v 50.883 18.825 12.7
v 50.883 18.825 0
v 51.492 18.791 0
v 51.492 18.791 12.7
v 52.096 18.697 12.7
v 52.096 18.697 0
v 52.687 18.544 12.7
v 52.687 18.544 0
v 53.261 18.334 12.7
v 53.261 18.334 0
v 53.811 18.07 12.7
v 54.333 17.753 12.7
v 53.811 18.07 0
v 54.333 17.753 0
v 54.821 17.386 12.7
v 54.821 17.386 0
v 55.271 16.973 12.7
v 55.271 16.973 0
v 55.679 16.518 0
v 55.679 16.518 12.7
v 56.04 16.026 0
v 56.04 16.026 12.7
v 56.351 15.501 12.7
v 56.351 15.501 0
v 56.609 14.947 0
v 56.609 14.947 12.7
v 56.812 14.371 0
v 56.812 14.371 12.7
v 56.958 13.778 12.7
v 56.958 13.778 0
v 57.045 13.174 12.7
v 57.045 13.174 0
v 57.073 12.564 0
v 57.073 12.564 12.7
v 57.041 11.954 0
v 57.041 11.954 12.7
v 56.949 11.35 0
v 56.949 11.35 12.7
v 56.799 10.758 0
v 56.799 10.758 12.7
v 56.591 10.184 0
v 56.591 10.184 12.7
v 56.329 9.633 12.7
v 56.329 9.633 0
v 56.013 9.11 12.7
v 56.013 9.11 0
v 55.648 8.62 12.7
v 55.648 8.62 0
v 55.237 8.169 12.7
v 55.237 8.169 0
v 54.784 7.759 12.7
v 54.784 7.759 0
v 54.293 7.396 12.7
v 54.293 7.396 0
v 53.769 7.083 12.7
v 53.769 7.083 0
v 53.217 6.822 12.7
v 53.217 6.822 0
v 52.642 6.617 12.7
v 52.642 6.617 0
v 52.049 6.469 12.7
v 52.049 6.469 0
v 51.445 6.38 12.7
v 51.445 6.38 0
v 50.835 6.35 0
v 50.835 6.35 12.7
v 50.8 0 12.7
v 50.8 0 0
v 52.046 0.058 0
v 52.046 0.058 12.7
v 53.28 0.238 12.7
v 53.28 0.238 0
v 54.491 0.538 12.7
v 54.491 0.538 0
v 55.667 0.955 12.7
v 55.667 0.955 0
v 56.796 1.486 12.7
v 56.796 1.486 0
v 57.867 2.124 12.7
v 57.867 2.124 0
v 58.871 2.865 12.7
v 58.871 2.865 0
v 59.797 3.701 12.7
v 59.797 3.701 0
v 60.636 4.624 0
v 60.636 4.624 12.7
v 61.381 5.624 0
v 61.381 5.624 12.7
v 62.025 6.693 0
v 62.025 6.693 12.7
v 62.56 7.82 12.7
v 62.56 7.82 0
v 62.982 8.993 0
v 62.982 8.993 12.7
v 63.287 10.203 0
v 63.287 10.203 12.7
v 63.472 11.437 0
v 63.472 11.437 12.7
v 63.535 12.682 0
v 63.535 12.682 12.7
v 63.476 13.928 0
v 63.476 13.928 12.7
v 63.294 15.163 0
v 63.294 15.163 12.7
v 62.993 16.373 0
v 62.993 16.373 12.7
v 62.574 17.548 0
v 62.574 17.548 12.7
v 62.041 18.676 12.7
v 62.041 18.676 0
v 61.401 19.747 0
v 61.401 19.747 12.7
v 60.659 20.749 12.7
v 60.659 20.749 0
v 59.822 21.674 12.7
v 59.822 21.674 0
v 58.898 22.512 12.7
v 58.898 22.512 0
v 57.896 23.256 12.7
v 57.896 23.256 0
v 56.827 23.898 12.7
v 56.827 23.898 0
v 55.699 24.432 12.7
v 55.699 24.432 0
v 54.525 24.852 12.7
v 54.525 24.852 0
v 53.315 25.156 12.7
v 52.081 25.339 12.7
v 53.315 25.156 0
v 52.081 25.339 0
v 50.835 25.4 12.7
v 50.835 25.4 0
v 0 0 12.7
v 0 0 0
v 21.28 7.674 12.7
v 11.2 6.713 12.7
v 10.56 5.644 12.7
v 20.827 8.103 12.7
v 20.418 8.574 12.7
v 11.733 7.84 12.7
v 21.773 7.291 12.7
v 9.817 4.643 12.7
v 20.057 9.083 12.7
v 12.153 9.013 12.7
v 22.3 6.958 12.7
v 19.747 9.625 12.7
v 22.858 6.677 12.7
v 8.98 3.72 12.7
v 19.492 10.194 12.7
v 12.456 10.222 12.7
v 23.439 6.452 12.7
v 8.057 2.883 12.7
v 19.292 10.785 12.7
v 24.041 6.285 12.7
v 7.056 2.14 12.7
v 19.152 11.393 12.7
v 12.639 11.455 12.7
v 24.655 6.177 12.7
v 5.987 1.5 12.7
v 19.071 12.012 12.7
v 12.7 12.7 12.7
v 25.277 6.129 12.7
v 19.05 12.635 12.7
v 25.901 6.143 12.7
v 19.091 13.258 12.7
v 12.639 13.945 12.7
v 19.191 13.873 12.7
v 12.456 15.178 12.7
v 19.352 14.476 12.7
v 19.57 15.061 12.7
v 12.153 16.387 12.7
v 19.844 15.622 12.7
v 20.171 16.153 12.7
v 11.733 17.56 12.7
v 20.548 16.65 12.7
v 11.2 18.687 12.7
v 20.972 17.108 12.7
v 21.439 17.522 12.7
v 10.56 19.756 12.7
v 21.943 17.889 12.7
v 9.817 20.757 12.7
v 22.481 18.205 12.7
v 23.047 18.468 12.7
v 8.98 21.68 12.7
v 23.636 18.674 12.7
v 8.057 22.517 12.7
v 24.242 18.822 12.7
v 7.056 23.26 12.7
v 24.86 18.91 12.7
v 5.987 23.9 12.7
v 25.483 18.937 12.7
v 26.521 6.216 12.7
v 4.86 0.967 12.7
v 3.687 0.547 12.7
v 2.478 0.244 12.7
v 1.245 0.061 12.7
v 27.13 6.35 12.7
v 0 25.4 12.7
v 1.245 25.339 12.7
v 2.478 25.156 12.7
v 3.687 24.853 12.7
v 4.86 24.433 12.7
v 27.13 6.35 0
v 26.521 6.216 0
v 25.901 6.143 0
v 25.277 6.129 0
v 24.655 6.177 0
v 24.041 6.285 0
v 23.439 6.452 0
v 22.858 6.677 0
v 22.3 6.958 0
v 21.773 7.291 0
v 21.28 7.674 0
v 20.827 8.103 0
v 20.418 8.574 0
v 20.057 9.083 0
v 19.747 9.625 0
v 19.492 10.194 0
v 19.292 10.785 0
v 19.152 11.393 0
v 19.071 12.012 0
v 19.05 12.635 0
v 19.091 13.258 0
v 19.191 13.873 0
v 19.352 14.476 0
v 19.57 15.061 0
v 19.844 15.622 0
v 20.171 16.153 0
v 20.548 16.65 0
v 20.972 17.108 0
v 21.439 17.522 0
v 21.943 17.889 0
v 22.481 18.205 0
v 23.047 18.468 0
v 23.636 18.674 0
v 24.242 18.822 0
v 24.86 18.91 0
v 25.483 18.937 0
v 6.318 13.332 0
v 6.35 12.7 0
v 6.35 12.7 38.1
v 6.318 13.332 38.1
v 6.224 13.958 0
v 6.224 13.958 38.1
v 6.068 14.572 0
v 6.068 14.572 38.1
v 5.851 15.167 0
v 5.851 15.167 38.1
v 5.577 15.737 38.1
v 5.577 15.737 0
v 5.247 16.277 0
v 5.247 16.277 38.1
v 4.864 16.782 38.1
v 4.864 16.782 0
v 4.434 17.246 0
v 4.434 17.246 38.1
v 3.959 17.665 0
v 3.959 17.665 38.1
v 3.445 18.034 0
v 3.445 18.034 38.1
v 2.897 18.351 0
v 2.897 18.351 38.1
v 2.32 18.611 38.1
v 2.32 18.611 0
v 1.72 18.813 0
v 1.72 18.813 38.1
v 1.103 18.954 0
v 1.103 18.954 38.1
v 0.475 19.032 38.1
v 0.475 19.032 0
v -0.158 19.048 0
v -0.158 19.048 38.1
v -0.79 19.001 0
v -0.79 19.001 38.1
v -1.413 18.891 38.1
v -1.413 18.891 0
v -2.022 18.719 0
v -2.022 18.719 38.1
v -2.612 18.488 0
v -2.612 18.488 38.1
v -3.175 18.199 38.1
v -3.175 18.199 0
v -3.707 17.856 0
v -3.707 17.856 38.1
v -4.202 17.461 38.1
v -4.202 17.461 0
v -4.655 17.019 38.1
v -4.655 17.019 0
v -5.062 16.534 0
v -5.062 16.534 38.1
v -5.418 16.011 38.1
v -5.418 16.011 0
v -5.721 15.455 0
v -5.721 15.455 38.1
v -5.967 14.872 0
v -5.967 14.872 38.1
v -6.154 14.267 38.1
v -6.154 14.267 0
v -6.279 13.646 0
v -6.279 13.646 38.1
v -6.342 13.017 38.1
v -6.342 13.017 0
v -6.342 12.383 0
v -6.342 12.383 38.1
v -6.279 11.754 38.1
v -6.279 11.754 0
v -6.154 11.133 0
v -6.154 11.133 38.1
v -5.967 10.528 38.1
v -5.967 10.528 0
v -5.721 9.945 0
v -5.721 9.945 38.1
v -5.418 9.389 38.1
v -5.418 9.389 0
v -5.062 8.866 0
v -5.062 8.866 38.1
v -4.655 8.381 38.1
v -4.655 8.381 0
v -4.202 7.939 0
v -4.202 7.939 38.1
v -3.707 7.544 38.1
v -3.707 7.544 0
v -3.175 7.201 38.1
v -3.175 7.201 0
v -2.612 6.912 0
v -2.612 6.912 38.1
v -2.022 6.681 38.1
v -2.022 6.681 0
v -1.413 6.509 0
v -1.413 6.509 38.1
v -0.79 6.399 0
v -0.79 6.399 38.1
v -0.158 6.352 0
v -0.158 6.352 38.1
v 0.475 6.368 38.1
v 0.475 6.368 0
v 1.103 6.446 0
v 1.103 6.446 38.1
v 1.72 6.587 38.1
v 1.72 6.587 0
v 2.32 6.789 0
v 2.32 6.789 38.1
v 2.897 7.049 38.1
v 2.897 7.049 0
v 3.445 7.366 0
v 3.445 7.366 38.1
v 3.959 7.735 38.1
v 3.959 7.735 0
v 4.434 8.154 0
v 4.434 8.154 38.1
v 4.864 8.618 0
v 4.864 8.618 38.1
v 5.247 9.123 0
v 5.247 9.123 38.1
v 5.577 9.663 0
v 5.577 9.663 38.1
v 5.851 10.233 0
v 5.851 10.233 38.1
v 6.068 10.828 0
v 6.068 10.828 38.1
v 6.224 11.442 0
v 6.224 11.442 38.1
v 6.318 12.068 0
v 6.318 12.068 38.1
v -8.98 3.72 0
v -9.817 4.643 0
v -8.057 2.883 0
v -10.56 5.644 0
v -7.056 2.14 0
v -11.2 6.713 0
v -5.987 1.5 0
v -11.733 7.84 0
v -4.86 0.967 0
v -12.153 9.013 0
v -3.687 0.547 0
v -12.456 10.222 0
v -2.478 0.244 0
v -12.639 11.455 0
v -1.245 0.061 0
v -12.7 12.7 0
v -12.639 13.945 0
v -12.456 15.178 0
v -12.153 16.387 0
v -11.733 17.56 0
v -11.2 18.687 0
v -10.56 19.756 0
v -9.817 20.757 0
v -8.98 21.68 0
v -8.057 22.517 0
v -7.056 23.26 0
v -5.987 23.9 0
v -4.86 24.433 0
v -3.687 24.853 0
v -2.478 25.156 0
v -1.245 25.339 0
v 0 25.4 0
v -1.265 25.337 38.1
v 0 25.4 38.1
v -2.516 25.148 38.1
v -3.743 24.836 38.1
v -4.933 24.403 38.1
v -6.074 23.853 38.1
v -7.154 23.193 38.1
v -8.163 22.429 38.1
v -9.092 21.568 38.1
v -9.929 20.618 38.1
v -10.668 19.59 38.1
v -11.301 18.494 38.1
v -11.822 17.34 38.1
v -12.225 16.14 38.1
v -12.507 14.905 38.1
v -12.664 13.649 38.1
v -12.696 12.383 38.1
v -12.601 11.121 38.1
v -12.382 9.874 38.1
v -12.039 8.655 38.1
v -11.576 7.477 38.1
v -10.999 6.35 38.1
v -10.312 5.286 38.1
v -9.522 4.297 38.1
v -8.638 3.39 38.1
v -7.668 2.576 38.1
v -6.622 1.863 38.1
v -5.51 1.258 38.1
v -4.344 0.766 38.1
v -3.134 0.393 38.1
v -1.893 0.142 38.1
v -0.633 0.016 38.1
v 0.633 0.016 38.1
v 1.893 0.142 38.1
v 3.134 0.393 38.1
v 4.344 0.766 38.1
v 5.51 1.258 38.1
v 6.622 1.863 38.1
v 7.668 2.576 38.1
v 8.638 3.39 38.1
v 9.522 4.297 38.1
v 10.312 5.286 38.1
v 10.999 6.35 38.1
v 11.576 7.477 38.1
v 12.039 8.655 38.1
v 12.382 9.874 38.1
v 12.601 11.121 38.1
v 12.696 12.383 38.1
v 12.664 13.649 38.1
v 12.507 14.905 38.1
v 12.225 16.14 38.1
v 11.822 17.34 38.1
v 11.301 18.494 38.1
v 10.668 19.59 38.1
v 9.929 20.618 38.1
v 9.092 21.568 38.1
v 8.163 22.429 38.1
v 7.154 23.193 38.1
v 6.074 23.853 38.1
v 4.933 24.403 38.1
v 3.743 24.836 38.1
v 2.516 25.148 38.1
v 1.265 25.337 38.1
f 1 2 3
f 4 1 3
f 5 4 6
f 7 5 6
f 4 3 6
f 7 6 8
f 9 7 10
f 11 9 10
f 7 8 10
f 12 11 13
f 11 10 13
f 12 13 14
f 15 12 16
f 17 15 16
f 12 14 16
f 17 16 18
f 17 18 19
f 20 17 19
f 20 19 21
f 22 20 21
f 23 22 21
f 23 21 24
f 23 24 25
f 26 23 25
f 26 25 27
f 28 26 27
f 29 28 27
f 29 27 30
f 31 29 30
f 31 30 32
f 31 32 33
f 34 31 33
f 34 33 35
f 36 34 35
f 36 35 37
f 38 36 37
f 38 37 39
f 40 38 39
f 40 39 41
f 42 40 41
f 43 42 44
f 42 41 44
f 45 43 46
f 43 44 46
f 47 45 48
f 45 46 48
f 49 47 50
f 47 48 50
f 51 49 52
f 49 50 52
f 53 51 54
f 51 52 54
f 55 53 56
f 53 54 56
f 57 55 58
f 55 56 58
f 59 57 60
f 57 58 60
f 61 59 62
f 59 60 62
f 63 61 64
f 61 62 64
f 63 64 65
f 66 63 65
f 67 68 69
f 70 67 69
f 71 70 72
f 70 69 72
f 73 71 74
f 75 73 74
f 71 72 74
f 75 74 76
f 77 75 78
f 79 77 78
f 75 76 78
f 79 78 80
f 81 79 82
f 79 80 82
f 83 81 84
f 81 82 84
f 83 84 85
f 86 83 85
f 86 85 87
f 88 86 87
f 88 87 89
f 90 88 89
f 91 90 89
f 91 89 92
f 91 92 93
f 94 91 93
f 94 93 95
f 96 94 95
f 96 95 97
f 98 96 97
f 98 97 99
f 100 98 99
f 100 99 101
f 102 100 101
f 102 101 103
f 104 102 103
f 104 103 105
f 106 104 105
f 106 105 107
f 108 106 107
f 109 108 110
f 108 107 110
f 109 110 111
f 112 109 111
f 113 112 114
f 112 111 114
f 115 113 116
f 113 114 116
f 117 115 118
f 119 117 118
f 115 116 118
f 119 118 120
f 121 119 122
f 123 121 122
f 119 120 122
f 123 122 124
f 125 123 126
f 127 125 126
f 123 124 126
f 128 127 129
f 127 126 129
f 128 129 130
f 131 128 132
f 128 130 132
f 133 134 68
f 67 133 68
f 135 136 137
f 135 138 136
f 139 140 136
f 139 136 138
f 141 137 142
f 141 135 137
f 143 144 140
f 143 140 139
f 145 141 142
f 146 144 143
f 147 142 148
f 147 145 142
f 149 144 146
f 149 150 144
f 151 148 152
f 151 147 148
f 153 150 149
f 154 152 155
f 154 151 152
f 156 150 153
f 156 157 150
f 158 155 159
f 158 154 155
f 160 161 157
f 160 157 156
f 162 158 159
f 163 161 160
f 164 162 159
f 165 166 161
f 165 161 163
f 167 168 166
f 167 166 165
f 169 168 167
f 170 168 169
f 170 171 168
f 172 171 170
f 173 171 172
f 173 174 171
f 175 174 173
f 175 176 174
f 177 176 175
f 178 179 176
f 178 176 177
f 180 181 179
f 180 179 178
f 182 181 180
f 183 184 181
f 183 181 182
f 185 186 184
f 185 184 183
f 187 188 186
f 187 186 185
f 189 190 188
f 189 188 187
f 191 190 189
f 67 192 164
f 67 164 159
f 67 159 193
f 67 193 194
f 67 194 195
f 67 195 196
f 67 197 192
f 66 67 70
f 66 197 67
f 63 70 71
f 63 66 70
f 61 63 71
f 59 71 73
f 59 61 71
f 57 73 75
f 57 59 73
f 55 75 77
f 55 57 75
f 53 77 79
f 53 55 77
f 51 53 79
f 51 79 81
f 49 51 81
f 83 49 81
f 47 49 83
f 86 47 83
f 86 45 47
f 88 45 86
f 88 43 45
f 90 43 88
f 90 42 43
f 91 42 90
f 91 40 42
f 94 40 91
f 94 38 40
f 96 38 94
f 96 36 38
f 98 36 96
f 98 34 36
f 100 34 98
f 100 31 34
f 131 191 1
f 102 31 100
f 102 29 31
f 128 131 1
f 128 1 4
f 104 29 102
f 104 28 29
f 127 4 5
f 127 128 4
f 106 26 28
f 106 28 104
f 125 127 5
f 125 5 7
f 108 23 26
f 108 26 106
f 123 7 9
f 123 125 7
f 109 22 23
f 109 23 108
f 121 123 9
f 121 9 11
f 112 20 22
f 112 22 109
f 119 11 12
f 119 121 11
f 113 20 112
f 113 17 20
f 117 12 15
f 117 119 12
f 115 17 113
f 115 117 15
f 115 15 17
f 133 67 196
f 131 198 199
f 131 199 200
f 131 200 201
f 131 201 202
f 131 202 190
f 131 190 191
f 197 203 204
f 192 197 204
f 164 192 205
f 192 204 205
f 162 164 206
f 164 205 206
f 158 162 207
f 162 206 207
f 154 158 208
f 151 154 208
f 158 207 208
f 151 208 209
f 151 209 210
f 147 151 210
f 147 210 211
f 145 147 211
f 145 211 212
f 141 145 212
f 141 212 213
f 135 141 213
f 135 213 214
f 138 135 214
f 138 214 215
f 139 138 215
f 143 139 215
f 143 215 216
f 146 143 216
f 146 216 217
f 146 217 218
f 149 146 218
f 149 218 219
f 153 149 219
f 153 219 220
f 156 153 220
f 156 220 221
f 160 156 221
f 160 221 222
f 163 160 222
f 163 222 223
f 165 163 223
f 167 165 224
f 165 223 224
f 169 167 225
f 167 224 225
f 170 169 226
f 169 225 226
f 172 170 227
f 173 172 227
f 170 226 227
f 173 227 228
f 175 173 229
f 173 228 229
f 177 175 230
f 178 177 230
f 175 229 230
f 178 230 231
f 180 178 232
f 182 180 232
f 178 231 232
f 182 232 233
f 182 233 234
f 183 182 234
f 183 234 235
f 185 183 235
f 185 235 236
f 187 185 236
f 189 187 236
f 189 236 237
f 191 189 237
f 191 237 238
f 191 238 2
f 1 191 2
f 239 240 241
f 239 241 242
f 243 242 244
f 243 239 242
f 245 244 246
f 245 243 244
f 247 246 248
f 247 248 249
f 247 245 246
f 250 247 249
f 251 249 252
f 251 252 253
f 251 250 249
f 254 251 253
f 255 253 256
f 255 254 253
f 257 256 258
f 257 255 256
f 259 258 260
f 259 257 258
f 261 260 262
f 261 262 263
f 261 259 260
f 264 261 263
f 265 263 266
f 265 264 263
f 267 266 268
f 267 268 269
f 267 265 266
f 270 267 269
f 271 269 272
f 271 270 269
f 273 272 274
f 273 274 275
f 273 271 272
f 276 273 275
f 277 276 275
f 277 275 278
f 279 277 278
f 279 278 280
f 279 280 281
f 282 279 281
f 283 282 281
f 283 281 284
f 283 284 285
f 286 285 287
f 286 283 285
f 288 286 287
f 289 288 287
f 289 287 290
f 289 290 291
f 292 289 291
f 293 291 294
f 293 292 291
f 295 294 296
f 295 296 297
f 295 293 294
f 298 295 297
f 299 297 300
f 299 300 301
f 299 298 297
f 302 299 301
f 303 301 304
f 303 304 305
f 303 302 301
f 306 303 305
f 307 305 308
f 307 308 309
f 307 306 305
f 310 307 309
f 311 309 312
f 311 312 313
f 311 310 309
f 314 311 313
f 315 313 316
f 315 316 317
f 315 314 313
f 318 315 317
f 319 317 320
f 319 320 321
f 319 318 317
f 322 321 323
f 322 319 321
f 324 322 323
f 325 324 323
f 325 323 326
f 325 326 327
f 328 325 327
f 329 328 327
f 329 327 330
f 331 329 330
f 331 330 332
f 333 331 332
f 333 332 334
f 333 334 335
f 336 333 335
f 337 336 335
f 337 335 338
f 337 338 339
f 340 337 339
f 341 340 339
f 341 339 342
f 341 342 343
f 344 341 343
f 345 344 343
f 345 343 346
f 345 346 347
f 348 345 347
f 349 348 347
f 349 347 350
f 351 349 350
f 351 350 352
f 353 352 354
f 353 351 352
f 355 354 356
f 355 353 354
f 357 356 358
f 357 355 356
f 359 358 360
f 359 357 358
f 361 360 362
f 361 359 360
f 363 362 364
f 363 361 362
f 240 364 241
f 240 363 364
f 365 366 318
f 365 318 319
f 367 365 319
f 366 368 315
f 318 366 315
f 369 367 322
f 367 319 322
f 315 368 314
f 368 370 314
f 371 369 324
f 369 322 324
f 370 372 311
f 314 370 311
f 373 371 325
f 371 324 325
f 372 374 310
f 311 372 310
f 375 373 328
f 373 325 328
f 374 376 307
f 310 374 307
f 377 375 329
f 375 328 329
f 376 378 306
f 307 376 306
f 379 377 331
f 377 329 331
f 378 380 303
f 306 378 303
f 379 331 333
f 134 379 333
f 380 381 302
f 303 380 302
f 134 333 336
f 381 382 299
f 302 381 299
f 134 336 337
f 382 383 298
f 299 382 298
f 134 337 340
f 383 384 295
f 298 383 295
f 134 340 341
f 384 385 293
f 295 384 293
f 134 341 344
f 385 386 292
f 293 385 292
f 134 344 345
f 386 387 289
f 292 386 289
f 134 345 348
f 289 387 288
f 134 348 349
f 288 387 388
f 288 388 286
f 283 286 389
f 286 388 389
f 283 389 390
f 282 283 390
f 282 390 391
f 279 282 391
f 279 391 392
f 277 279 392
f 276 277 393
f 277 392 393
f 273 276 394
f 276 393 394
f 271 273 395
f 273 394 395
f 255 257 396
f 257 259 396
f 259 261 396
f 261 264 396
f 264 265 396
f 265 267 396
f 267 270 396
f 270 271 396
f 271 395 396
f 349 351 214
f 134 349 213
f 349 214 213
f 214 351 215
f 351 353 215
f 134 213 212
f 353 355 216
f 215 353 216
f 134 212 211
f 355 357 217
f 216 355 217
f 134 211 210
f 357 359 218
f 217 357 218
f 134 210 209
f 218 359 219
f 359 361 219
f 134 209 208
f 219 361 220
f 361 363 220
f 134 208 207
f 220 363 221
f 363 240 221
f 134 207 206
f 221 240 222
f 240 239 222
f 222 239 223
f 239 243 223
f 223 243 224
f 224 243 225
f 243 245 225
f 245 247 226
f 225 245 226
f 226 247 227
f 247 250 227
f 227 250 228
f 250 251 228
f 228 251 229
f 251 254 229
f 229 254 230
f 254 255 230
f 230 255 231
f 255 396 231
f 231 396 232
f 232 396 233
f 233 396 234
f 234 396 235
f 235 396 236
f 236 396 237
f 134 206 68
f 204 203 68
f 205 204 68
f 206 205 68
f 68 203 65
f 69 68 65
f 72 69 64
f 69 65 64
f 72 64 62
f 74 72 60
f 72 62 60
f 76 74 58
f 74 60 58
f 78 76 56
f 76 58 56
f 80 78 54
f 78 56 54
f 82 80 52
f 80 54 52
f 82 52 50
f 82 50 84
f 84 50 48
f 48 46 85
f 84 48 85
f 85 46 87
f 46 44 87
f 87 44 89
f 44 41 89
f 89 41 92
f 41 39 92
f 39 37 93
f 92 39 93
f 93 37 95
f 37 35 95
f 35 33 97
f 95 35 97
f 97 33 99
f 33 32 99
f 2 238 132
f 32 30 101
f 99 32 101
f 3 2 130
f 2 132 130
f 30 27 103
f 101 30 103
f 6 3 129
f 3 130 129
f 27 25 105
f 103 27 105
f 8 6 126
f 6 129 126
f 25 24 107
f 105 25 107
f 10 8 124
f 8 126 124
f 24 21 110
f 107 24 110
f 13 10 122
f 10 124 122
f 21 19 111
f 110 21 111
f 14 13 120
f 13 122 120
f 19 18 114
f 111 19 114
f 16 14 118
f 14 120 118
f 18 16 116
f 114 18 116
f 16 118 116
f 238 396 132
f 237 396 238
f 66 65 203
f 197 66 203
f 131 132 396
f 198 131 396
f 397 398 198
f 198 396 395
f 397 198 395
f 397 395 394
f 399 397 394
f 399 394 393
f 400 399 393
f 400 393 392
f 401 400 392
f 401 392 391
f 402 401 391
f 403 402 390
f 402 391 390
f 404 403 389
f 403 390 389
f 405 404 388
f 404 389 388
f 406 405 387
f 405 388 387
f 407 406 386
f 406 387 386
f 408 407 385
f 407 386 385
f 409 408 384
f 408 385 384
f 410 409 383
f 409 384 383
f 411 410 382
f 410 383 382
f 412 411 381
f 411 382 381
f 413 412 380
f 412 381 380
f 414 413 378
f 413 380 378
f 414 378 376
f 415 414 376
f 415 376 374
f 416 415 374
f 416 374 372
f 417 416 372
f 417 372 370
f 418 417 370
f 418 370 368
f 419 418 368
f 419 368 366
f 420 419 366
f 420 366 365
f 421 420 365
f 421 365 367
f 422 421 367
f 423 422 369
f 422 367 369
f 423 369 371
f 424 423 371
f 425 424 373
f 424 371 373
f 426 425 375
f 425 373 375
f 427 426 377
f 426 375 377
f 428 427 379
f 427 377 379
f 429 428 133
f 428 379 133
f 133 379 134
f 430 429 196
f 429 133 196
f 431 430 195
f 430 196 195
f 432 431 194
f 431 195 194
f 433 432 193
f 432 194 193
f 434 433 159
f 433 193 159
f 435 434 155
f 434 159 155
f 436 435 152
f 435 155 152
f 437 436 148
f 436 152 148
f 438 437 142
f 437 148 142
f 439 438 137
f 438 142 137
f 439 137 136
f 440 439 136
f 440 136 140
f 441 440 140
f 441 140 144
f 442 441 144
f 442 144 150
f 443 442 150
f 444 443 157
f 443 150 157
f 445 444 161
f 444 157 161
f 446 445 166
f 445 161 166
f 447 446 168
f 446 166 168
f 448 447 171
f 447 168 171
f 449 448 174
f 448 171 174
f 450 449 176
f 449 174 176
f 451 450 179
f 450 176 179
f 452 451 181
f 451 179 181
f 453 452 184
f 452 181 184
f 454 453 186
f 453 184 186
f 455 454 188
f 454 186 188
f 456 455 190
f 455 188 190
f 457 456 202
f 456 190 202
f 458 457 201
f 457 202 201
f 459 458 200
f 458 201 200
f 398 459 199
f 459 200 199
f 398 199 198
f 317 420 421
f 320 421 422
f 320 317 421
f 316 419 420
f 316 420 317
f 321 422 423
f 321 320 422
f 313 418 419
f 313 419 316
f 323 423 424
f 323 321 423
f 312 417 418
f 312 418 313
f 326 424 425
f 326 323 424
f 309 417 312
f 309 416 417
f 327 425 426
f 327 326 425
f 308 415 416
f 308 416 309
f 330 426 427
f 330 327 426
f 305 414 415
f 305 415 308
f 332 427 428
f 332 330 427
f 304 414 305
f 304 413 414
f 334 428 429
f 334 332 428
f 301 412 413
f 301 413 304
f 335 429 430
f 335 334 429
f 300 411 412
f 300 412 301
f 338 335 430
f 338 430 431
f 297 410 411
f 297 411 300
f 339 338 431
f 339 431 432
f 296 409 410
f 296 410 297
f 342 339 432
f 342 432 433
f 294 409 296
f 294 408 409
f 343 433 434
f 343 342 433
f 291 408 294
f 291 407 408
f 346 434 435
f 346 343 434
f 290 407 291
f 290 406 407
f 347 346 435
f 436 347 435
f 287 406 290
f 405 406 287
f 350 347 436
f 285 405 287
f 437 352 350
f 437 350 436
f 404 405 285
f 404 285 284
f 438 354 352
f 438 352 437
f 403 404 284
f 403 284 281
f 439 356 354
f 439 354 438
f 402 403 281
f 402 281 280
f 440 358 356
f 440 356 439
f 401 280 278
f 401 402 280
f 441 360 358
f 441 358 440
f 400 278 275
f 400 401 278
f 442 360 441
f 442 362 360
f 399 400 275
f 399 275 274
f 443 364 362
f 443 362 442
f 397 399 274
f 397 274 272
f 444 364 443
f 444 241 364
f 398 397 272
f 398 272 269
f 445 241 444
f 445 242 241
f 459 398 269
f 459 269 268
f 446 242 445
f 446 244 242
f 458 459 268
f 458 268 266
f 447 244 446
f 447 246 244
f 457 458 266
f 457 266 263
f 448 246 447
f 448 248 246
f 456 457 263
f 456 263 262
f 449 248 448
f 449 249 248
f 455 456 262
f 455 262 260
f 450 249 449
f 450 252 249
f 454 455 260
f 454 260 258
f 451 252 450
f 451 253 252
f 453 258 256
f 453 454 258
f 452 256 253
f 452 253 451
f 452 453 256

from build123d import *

# Parameters (mm, degrees)
F0_R     = 6.35
F1_DEPTH = 38.1
F3_DEPTH = 25.4


with BuildPart() as f1:
    # F0 (on Top) → F1 (new body)
    with BuildSketch(Plane.XY):
        with BuildLine():
            ThreePointArc((0, 25.4), (-12.7, 12.7), (0, 0))
            Line((0, 0), (50.8, 0))
            ThreePointArc((50.8, 0), (63.535209, 12.682377), (50.835197, 25.4))
            Line((50.835197, 25.4), (0, 25.4))
        make_face()
        with BuildLine():
            Line((25.483008, 18.937421), (50.88276, 18.825148))
            ThreePointArc((50.88276, 18.825148), (57.072841, 12.563859), (50.835197, 6.349951))
            Line((50.835197, 6.349951), (27.129976, 6.349951))
            ThreePointArc((27.129976, 6.349951), (19.103581, 11.701243), (25.483008, 18.937421))
        make_face(mode=Mode.SUBTRACT)
        with Locations((0, 12.7)):
            Circle(F0_R, mode=Mode.SUBTRACT)
    extrude(amount=F1_DEPTH)

    # F2 (on face) → F3 (cut)
    with BuildSketch(Plane.XY.offset(38.1)):
        with BuildLine():
            ThreePointArc((0, 25.4), (12.7, 12.7), (0, 0))
            Line((0, 0), (50.8, 0))
            ThreePointArc((50.8, 0), (63.535209, 12.682377), (50.835197, 25.4))
            Line((50.835197, 25.4), (0, 25.4))
        make_face()
        with BuildLine():
            Line((50.835197, 6.349951), (27.129976, 6.349951))
            ThreePointArc((27.129976, 6.349951), (19.103581, 11.701243), (25.483008, 18.937421))
            Line((25.483008, 18.937421), (50.88276, 18.825148))
            ThreePointArc((50.88276, 18.825148), (57.072841, 12.563859), (50.835197, 6.349951))
        make_face(mode=Mode.SUBTRACT)
    extrude(amount=-F3_DEPTH, mode=Mode.SUBTRACT)


solid = f1.part
